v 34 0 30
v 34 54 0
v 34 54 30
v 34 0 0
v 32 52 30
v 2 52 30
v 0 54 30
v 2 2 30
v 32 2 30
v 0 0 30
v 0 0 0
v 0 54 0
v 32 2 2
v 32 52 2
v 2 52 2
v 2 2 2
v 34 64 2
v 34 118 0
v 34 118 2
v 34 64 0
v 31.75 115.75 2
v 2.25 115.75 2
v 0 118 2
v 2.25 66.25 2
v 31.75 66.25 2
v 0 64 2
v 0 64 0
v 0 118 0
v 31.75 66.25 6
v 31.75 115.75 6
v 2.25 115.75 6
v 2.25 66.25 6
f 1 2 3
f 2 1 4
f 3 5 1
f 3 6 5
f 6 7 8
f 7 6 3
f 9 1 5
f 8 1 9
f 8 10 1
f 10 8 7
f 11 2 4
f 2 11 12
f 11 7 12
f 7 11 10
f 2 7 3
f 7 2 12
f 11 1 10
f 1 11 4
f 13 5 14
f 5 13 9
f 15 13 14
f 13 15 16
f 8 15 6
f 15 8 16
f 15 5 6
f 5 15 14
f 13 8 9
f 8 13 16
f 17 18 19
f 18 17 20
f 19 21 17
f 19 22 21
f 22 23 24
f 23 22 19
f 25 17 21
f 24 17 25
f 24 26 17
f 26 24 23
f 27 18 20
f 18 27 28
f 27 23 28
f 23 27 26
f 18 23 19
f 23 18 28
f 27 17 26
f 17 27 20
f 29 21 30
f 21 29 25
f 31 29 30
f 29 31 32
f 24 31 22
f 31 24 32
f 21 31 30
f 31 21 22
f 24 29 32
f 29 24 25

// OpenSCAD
// Box with a press-fit lid - a hollow rectangular box (open top) and a separate lid whose plug
// drops into the opening. The two parts are laid side by side. NOVEL general part.
//
// @desc hollow box with a separate press-fit lid
// @prompt Design a small box with a lid in OpenSCAD: an inner space {il} by {iw} by {ih} mm with {wall} mm walls, and a separate lid whose plug drops {lip} mm into the opening. Lay the two parts side by side. Reply with a single complete OpenSCAD file.
// @param il   inner length, mm     [20:80]
// @param iw   inner width, mm      [20:60]
// @param ih   inner height, mm     [10:50]
// @param wall wall thickness, mm   [1.6:4]
// @param lip  lid plug depth, mm   [3:10]

il   = 30;
iw   = 50;
ih   = 28;
wall = 2;
lip  = 4;

$fn = 32;

ol = il + 2 * wall;
ow = iw + 2 * wall;

module box() {
    difference() {
        cube([ol, ow, ih + wall]);
        translate([wall, wall, wall]) cube([il, iw, ih + 1]);   // open-top cavity
    }
}

module lid() {
    cl = il - 0.5;                 // plug: 0.25 mm clearance per side
    cw = iw - 0.5;
    union() {
        cube([ol, ow, wall]);                                    // top plate, full footprint
        translate([(ol - cl) / 2, (ow - cw) / 2, 0])
            cube([cl, cw, wall + lip]);                          // plug (overlaps the plate -> one solid)
    }
}

box();
translate([0, ow + 10, 0]) lid();
